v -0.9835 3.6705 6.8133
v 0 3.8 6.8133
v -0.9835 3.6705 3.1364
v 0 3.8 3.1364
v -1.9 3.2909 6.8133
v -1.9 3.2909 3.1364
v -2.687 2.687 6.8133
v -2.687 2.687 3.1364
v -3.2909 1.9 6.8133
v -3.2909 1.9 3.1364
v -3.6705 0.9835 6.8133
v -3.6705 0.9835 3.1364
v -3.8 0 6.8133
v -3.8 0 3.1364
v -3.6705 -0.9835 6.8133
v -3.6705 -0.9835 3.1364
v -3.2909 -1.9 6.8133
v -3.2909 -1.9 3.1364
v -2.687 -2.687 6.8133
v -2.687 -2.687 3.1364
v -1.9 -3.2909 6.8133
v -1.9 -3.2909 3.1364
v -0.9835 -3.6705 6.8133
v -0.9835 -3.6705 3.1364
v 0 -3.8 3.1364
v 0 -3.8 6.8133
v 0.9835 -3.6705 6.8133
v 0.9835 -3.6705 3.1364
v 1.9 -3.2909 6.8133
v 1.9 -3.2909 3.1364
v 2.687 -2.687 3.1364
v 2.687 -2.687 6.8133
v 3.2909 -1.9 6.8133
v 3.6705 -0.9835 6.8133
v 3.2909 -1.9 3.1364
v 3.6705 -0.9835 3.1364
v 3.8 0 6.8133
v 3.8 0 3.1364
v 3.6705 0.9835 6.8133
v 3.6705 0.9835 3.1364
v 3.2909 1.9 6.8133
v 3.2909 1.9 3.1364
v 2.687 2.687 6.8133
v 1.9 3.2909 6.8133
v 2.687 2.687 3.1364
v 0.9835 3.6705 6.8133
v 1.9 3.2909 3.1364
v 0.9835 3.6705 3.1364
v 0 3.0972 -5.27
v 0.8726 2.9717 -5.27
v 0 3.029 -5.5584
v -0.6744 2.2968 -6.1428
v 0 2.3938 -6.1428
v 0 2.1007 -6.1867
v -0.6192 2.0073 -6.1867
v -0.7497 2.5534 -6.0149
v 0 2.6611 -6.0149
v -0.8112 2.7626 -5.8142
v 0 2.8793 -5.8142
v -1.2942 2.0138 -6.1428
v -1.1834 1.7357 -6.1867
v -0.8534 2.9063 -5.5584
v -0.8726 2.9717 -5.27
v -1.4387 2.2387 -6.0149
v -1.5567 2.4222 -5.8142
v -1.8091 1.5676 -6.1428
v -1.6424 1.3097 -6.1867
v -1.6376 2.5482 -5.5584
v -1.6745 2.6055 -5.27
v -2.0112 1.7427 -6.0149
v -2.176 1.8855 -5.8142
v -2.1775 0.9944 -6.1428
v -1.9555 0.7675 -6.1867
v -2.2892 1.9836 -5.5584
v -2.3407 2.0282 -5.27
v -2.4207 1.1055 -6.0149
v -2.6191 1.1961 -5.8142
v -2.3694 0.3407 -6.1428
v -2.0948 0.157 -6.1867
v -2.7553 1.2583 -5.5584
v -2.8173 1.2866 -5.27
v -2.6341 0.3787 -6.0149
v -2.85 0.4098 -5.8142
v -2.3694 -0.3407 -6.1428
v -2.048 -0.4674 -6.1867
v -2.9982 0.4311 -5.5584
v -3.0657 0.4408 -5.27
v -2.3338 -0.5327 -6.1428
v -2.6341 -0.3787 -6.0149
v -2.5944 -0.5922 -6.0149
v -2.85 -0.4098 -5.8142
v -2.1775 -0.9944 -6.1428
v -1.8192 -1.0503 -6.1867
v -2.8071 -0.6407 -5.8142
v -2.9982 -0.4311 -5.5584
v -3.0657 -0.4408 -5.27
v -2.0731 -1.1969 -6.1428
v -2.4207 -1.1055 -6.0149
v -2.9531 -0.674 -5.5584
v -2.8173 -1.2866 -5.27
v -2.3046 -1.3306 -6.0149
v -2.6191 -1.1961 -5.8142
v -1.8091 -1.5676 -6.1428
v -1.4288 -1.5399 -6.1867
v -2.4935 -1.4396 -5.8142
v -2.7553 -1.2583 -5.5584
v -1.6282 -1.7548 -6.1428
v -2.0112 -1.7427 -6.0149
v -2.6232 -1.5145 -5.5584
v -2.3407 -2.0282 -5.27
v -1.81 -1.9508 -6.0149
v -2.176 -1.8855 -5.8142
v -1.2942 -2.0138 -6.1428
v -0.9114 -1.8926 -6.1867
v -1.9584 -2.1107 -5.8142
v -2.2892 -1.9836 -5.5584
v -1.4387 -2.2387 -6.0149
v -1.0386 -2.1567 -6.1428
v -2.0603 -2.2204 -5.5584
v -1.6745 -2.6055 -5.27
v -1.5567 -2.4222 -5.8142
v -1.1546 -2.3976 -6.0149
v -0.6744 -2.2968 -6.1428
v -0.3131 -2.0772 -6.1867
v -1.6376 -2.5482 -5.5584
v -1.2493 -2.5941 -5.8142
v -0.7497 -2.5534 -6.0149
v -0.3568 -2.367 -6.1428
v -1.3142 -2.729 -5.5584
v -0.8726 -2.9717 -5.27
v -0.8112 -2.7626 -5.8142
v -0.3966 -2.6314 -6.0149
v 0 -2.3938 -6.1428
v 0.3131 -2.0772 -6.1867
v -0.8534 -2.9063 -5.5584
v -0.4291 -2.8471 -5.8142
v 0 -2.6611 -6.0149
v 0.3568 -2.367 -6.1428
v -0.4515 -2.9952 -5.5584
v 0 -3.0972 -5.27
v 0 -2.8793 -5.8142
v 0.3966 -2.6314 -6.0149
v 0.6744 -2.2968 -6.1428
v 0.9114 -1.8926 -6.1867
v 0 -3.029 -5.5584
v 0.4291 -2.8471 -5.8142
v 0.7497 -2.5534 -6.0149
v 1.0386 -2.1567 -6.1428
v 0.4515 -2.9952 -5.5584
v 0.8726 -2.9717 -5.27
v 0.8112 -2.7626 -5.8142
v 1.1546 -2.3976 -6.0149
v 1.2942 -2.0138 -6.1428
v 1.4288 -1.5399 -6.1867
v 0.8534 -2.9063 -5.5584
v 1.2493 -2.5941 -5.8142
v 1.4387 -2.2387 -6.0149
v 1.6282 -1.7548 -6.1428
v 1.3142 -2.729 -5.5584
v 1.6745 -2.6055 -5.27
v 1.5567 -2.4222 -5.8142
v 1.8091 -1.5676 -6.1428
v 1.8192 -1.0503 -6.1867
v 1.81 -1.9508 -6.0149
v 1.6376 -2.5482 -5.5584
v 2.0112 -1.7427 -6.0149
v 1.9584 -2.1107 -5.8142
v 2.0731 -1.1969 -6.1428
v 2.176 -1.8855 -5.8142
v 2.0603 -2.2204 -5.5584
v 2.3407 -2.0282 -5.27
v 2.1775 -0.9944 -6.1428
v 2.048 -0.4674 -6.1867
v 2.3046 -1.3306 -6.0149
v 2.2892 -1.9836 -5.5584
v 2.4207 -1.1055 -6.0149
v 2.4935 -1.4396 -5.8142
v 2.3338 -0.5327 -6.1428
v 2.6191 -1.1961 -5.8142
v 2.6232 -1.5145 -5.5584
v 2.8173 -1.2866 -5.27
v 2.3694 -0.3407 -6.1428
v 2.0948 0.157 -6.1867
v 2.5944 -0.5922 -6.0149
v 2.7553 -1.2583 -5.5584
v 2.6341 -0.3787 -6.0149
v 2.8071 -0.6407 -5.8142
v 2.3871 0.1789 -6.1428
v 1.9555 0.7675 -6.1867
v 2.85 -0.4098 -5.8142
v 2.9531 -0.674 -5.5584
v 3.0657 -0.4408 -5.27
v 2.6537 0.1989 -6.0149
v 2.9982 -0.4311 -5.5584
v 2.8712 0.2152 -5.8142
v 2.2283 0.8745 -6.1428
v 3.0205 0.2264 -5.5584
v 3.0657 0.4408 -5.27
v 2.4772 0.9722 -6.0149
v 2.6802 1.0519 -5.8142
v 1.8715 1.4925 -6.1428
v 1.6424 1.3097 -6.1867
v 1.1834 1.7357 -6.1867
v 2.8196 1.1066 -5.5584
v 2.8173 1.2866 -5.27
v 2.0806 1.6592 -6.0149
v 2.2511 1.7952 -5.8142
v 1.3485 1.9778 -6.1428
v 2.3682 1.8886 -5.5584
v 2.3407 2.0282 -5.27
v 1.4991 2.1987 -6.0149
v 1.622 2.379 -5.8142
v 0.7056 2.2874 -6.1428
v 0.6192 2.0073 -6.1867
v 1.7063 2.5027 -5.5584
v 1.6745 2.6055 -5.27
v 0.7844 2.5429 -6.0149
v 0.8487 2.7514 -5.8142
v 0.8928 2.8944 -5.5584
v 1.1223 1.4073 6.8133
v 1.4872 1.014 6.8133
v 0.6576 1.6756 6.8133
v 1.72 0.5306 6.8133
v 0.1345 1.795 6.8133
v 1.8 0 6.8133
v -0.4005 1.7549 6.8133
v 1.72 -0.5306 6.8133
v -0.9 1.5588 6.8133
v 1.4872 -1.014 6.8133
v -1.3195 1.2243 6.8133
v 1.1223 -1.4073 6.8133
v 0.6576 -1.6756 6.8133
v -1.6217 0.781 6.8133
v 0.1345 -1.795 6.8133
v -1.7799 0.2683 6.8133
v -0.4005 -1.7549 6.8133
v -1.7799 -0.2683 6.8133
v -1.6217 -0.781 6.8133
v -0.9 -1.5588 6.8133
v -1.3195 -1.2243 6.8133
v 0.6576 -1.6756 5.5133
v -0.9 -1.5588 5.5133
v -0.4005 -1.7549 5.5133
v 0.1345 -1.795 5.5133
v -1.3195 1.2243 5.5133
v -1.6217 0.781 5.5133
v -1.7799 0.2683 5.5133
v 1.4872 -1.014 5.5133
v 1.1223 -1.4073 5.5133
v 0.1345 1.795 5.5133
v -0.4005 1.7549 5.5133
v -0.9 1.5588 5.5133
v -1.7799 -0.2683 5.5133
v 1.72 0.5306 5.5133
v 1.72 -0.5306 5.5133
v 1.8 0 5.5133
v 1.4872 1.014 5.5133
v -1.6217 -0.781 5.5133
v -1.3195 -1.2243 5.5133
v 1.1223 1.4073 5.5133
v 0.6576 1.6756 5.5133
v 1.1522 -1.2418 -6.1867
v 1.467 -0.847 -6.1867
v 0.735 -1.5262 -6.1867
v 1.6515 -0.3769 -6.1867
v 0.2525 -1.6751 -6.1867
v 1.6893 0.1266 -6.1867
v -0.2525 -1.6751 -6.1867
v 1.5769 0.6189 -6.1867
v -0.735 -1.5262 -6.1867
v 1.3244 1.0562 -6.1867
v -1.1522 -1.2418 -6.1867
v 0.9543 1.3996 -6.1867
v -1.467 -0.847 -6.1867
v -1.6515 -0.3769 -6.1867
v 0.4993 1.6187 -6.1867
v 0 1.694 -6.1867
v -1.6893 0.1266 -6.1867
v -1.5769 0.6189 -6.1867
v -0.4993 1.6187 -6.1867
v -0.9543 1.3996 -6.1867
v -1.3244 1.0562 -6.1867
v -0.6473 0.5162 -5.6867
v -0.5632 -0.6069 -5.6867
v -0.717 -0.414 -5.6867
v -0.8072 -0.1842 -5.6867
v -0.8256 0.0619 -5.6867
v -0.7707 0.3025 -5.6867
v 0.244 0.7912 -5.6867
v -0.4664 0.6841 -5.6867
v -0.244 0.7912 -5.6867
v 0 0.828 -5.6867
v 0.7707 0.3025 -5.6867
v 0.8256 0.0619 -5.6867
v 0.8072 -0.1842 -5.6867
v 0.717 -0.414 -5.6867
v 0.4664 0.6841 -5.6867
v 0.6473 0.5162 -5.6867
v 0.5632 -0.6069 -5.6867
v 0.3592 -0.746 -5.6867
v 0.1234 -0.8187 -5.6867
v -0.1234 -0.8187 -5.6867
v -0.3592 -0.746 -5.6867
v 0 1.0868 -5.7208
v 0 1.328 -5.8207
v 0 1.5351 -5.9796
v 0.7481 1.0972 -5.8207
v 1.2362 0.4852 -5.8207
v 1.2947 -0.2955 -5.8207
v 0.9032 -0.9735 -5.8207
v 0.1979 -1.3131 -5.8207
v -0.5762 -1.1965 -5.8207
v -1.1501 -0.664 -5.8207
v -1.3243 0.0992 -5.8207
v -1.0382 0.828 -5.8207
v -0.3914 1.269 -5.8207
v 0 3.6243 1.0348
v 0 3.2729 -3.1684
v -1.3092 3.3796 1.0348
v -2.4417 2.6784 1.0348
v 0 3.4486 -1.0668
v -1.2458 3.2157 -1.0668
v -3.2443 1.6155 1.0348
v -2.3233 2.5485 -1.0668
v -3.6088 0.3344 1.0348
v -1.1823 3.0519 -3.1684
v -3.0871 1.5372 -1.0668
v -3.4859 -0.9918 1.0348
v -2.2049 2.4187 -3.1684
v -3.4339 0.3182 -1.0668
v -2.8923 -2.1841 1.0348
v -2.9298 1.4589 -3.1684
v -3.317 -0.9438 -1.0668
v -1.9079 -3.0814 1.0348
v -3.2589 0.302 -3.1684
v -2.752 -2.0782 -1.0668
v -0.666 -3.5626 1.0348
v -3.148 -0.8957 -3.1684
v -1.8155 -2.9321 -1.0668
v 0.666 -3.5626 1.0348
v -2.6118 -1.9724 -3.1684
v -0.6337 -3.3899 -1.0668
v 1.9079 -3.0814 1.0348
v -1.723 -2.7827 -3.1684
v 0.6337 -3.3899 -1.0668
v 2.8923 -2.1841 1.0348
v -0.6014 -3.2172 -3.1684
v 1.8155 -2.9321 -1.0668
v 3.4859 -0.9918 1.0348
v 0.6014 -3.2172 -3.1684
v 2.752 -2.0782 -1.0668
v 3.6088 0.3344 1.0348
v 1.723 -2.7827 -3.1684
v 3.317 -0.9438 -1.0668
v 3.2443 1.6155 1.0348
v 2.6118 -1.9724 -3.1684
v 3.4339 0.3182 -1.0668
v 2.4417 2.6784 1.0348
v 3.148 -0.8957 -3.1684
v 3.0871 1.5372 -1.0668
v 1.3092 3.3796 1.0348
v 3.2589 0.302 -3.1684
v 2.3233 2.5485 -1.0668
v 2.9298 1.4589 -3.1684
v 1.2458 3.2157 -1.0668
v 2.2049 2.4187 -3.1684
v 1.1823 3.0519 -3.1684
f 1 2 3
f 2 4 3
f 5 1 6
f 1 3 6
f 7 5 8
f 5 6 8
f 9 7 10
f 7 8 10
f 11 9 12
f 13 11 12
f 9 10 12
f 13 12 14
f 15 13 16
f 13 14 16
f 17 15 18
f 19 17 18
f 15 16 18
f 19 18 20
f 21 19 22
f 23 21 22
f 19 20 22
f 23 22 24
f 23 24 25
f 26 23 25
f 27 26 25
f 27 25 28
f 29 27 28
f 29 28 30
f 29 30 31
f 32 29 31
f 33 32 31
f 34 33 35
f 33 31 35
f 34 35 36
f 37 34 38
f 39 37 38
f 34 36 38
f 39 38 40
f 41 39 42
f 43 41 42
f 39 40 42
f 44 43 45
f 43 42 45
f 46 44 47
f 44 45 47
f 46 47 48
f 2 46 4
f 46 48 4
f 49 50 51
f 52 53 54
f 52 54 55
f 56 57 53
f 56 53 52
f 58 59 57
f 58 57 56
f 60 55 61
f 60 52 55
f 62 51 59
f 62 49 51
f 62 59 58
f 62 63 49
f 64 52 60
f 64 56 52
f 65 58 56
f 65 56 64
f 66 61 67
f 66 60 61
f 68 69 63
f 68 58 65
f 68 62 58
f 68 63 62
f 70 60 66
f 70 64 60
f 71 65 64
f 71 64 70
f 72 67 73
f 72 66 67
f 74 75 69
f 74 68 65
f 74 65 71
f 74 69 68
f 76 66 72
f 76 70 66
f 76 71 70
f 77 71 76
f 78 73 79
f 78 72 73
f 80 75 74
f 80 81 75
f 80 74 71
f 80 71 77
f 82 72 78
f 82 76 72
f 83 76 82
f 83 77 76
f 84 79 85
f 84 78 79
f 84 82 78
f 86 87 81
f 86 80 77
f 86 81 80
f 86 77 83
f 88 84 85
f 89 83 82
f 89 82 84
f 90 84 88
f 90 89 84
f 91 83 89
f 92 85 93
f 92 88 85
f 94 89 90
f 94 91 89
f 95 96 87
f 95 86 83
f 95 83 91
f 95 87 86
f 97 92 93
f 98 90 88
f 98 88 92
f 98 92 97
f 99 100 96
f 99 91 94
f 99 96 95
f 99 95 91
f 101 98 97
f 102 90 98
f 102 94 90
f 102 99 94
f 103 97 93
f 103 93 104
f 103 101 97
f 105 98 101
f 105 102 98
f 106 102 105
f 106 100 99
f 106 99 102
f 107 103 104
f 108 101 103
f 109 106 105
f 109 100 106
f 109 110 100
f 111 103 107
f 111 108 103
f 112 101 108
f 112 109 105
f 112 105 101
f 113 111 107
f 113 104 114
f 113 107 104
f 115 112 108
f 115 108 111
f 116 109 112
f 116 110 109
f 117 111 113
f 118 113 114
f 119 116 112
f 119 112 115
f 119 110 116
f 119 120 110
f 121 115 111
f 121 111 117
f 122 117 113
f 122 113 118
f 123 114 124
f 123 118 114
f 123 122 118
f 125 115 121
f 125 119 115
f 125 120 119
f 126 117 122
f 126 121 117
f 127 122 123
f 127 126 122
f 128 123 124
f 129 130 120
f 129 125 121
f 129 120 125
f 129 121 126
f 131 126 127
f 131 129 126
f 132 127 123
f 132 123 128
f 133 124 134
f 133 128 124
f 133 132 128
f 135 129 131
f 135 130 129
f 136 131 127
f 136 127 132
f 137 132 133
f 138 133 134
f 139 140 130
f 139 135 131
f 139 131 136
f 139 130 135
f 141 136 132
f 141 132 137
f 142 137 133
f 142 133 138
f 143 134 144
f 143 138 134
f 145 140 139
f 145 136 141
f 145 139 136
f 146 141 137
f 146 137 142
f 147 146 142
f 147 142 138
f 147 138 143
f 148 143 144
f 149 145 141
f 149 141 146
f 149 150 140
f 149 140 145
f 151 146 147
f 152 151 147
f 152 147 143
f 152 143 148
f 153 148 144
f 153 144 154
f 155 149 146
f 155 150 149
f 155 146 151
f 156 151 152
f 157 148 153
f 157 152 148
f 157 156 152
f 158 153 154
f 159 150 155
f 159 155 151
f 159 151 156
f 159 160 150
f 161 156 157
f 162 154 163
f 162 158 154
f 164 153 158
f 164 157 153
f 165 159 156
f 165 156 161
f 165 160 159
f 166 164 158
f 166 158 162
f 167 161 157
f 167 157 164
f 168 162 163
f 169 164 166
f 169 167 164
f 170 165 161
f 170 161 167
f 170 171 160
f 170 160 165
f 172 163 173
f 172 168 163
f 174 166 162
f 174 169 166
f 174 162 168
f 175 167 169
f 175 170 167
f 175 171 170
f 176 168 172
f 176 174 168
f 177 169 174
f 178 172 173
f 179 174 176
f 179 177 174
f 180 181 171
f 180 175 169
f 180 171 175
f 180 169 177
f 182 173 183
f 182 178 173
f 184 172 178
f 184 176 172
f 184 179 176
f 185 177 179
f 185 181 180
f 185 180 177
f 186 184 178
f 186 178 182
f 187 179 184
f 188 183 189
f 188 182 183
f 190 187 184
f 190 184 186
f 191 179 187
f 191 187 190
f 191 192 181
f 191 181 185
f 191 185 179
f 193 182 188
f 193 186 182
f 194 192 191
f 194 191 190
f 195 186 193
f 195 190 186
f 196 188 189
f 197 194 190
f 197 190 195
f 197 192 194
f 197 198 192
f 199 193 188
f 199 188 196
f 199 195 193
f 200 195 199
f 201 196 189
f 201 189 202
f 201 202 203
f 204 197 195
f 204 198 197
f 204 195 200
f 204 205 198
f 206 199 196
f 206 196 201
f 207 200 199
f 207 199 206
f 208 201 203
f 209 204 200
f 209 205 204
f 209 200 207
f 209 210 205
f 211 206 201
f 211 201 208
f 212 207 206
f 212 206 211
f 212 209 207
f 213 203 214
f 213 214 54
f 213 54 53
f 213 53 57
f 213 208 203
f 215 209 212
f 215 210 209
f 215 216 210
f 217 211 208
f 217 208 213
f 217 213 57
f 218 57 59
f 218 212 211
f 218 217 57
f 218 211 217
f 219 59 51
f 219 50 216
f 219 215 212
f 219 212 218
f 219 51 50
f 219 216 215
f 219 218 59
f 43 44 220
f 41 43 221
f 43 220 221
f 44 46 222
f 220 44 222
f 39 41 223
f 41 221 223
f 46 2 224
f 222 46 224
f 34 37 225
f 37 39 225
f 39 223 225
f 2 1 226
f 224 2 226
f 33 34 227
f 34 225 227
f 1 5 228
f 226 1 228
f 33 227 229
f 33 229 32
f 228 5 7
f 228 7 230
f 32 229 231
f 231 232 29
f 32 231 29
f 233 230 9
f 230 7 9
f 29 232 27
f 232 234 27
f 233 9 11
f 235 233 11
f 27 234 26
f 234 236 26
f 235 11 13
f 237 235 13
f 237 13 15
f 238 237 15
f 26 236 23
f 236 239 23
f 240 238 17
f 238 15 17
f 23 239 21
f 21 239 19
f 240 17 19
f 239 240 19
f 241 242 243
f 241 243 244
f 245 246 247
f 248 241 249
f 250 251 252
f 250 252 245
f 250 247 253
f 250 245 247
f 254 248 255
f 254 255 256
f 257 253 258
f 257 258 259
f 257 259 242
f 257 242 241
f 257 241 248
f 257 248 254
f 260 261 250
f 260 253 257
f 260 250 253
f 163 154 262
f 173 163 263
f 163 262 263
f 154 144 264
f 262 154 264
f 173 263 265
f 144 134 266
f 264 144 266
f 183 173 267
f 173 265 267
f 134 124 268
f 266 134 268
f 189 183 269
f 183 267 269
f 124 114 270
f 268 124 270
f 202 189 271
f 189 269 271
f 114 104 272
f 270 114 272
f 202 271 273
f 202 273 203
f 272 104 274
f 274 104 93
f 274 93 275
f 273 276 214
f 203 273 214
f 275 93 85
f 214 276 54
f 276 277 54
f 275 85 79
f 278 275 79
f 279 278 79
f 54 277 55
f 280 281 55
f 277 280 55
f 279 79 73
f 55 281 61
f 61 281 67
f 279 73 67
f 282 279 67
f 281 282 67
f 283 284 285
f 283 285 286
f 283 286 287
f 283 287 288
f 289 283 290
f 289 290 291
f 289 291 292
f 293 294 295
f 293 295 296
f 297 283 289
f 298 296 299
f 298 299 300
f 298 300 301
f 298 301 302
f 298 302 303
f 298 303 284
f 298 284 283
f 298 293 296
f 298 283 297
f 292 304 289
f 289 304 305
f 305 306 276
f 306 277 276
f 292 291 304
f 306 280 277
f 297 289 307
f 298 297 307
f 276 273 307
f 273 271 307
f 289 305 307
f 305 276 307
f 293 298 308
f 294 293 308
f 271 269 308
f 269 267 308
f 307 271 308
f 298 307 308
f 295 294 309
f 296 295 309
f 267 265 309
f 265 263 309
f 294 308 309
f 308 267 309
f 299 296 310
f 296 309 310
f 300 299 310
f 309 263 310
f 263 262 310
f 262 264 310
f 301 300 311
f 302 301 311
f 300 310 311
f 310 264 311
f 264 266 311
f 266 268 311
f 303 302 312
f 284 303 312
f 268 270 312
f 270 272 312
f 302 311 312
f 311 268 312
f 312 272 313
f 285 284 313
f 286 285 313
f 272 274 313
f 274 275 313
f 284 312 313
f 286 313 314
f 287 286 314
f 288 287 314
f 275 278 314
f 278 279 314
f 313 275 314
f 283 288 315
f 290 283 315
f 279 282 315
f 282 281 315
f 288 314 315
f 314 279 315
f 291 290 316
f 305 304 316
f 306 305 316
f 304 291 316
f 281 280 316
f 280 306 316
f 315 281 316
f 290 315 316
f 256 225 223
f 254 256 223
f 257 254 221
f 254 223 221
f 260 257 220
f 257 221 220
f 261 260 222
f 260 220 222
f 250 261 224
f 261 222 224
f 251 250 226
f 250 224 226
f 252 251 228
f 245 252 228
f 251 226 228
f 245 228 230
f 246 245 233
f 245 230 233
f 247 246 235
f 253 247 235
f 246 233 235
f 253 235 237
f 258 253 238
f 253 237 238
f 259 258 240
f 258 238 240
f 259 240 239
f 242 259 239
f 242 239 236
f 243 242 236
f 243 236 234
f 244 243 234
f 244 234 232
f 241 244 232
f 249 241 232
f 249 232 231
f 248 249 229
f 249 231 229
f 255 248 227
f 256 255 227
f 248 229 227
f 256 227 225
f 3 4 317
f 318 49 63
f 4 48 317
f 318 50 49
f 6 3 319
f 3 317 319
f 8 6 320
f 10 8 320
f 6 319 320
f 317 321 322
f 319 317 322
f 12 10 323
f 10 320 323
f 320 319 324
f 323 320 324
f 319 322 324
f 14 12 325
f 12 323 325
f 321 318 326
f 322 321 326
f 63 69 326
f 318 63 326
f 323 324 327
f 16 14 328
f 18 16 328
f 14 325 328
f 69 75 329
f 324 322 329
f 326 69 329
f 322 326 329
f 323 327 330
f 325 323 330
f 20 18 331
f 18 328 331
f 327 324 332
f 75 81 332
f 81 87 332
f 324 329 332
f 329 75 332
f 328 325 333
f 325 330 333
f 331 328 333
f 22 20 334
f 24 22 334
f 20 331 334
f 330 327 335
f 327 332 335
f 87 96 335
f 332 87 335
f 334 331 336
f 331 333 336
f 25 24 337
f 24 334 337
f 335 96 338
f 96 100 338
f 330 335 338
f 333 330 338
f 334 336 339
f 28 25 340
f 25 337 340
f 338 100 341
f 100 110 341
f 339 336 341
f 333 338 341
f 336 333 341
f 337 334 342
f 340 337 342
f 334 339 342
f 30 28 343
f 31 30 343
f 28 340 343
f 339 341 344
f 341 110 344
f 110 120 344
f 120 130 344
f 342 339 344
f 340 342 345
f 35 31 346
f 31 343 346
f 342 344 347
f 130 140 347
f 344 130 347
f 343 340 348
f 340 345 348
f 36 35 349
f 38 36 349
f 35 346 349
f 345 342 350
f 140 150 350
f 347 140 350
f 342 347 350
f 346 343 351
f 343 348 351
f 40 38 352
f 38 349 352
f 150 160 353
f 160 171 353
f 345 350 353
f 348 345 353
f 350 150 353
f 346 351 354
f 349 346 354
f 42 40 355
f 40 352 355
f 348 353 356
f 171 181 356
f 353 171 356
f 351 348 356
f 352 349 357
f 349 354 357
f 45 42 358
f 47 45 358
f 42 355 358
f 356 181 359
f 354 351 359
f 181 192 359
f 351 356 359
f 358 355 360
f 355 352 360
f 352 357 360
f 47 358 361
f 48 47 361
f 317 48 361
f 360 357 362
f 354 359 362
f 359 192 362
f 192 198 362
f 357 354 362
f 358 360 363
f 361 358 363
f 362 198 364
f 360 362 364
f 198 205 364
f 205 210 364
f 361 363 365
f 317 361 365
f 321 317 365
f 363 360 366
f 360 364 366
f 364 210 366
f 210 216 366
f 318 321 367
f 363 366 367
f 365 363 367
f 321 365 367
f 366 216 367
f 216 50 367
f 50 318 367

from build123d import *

# Parameters (mm, degrees)
SKETCH_5_R          = 1.8
CUT_EXTRUDE_2_DEPTH = 1.3
FILLET_1_R          = 1
SKETCH_6_R          = 1.693988814
CUT_EXTRUDE_3_DEPTH = 0.5
FILLET_2_R          = 1


with BuildPart() as part:
    # 草图1 → 旋转1 (revolve)
    with BuildSketch(Plane(origin=(0, 0, 0), x_dir=(0, 0, -1), z_dir=(1, 0, 0))):
        Polygon((6.186687636, 3.02056076), (6.186687636, 0), (-6.813312364, 0), (-6.813312364, 3.8), (-3.136442493, 3.8), align=None)
    revolve(axis=Axis((0, 0, -6.352286977), (0, 0, 1)))

    # 草图5 → 切除-拉伸2 (cut)
    with BuildSketch(Plane.XY.offset(6.813312364)):
        Circle(SKETCH_5_R)
    extrude(amount=-CUT_EXTRUDE_2_DEPTH, mode=Mode.SUBTRACT)

    # 圆角1
    fillet_1_edges = [part.edges().sort_by_distance(p)[0] for p in [
        (0, -3.02056076, -6.186687636),
    ]]
    fillet(fillet_1_edges, radius=FILLET_1_R)

    # 草图6 → 切除-拉伸3 (cut)
    with BuildSketch(Plane(origin=(0, 0, -6.186687636), x_dir=(-1, 0, 0), z_dir=(0, 0, -1))):
        with Locations(Location((0, 0, 0), (0, 0, 90))):
            Circle(SKETCH_6_R)
    extrude(amount=-CUT_EXTRUDE_3_DEPTH, mode=Mode.SUBTRACT)

    # 圆角2
    # the kernel refuses this fillet: 1 mm, written as the material it adds along each edge
    with BuildSketch(Plane(origin=(0, 0, -5.686687636), x_dir=(0, 1, 0), z_dir=(-1, 0, 0))) as fillet_2_piece_1:
        with BuildLine():
            CenterArc((0.82796341, 1), FILLET_2_R, 270, 60)
            Line((0.82796341, 0), (0.82796341, -0.02))
            Line((0.82796341, -0.02), (1.693988814, -0.02))
            Line((1.693988814, -0.02), (1.713988814, 0))
            ThreePointArc((1.713988814, 0), (1.713988814, 0.25), (1.711309322, 0.49))
            Line((1.711309322, 0.49), (1.693988814, 0.5))
        make_face()
    revolve(axis=Axis((0, 0, -5.686687636), (0, 0, -1)))


solid = part.part
